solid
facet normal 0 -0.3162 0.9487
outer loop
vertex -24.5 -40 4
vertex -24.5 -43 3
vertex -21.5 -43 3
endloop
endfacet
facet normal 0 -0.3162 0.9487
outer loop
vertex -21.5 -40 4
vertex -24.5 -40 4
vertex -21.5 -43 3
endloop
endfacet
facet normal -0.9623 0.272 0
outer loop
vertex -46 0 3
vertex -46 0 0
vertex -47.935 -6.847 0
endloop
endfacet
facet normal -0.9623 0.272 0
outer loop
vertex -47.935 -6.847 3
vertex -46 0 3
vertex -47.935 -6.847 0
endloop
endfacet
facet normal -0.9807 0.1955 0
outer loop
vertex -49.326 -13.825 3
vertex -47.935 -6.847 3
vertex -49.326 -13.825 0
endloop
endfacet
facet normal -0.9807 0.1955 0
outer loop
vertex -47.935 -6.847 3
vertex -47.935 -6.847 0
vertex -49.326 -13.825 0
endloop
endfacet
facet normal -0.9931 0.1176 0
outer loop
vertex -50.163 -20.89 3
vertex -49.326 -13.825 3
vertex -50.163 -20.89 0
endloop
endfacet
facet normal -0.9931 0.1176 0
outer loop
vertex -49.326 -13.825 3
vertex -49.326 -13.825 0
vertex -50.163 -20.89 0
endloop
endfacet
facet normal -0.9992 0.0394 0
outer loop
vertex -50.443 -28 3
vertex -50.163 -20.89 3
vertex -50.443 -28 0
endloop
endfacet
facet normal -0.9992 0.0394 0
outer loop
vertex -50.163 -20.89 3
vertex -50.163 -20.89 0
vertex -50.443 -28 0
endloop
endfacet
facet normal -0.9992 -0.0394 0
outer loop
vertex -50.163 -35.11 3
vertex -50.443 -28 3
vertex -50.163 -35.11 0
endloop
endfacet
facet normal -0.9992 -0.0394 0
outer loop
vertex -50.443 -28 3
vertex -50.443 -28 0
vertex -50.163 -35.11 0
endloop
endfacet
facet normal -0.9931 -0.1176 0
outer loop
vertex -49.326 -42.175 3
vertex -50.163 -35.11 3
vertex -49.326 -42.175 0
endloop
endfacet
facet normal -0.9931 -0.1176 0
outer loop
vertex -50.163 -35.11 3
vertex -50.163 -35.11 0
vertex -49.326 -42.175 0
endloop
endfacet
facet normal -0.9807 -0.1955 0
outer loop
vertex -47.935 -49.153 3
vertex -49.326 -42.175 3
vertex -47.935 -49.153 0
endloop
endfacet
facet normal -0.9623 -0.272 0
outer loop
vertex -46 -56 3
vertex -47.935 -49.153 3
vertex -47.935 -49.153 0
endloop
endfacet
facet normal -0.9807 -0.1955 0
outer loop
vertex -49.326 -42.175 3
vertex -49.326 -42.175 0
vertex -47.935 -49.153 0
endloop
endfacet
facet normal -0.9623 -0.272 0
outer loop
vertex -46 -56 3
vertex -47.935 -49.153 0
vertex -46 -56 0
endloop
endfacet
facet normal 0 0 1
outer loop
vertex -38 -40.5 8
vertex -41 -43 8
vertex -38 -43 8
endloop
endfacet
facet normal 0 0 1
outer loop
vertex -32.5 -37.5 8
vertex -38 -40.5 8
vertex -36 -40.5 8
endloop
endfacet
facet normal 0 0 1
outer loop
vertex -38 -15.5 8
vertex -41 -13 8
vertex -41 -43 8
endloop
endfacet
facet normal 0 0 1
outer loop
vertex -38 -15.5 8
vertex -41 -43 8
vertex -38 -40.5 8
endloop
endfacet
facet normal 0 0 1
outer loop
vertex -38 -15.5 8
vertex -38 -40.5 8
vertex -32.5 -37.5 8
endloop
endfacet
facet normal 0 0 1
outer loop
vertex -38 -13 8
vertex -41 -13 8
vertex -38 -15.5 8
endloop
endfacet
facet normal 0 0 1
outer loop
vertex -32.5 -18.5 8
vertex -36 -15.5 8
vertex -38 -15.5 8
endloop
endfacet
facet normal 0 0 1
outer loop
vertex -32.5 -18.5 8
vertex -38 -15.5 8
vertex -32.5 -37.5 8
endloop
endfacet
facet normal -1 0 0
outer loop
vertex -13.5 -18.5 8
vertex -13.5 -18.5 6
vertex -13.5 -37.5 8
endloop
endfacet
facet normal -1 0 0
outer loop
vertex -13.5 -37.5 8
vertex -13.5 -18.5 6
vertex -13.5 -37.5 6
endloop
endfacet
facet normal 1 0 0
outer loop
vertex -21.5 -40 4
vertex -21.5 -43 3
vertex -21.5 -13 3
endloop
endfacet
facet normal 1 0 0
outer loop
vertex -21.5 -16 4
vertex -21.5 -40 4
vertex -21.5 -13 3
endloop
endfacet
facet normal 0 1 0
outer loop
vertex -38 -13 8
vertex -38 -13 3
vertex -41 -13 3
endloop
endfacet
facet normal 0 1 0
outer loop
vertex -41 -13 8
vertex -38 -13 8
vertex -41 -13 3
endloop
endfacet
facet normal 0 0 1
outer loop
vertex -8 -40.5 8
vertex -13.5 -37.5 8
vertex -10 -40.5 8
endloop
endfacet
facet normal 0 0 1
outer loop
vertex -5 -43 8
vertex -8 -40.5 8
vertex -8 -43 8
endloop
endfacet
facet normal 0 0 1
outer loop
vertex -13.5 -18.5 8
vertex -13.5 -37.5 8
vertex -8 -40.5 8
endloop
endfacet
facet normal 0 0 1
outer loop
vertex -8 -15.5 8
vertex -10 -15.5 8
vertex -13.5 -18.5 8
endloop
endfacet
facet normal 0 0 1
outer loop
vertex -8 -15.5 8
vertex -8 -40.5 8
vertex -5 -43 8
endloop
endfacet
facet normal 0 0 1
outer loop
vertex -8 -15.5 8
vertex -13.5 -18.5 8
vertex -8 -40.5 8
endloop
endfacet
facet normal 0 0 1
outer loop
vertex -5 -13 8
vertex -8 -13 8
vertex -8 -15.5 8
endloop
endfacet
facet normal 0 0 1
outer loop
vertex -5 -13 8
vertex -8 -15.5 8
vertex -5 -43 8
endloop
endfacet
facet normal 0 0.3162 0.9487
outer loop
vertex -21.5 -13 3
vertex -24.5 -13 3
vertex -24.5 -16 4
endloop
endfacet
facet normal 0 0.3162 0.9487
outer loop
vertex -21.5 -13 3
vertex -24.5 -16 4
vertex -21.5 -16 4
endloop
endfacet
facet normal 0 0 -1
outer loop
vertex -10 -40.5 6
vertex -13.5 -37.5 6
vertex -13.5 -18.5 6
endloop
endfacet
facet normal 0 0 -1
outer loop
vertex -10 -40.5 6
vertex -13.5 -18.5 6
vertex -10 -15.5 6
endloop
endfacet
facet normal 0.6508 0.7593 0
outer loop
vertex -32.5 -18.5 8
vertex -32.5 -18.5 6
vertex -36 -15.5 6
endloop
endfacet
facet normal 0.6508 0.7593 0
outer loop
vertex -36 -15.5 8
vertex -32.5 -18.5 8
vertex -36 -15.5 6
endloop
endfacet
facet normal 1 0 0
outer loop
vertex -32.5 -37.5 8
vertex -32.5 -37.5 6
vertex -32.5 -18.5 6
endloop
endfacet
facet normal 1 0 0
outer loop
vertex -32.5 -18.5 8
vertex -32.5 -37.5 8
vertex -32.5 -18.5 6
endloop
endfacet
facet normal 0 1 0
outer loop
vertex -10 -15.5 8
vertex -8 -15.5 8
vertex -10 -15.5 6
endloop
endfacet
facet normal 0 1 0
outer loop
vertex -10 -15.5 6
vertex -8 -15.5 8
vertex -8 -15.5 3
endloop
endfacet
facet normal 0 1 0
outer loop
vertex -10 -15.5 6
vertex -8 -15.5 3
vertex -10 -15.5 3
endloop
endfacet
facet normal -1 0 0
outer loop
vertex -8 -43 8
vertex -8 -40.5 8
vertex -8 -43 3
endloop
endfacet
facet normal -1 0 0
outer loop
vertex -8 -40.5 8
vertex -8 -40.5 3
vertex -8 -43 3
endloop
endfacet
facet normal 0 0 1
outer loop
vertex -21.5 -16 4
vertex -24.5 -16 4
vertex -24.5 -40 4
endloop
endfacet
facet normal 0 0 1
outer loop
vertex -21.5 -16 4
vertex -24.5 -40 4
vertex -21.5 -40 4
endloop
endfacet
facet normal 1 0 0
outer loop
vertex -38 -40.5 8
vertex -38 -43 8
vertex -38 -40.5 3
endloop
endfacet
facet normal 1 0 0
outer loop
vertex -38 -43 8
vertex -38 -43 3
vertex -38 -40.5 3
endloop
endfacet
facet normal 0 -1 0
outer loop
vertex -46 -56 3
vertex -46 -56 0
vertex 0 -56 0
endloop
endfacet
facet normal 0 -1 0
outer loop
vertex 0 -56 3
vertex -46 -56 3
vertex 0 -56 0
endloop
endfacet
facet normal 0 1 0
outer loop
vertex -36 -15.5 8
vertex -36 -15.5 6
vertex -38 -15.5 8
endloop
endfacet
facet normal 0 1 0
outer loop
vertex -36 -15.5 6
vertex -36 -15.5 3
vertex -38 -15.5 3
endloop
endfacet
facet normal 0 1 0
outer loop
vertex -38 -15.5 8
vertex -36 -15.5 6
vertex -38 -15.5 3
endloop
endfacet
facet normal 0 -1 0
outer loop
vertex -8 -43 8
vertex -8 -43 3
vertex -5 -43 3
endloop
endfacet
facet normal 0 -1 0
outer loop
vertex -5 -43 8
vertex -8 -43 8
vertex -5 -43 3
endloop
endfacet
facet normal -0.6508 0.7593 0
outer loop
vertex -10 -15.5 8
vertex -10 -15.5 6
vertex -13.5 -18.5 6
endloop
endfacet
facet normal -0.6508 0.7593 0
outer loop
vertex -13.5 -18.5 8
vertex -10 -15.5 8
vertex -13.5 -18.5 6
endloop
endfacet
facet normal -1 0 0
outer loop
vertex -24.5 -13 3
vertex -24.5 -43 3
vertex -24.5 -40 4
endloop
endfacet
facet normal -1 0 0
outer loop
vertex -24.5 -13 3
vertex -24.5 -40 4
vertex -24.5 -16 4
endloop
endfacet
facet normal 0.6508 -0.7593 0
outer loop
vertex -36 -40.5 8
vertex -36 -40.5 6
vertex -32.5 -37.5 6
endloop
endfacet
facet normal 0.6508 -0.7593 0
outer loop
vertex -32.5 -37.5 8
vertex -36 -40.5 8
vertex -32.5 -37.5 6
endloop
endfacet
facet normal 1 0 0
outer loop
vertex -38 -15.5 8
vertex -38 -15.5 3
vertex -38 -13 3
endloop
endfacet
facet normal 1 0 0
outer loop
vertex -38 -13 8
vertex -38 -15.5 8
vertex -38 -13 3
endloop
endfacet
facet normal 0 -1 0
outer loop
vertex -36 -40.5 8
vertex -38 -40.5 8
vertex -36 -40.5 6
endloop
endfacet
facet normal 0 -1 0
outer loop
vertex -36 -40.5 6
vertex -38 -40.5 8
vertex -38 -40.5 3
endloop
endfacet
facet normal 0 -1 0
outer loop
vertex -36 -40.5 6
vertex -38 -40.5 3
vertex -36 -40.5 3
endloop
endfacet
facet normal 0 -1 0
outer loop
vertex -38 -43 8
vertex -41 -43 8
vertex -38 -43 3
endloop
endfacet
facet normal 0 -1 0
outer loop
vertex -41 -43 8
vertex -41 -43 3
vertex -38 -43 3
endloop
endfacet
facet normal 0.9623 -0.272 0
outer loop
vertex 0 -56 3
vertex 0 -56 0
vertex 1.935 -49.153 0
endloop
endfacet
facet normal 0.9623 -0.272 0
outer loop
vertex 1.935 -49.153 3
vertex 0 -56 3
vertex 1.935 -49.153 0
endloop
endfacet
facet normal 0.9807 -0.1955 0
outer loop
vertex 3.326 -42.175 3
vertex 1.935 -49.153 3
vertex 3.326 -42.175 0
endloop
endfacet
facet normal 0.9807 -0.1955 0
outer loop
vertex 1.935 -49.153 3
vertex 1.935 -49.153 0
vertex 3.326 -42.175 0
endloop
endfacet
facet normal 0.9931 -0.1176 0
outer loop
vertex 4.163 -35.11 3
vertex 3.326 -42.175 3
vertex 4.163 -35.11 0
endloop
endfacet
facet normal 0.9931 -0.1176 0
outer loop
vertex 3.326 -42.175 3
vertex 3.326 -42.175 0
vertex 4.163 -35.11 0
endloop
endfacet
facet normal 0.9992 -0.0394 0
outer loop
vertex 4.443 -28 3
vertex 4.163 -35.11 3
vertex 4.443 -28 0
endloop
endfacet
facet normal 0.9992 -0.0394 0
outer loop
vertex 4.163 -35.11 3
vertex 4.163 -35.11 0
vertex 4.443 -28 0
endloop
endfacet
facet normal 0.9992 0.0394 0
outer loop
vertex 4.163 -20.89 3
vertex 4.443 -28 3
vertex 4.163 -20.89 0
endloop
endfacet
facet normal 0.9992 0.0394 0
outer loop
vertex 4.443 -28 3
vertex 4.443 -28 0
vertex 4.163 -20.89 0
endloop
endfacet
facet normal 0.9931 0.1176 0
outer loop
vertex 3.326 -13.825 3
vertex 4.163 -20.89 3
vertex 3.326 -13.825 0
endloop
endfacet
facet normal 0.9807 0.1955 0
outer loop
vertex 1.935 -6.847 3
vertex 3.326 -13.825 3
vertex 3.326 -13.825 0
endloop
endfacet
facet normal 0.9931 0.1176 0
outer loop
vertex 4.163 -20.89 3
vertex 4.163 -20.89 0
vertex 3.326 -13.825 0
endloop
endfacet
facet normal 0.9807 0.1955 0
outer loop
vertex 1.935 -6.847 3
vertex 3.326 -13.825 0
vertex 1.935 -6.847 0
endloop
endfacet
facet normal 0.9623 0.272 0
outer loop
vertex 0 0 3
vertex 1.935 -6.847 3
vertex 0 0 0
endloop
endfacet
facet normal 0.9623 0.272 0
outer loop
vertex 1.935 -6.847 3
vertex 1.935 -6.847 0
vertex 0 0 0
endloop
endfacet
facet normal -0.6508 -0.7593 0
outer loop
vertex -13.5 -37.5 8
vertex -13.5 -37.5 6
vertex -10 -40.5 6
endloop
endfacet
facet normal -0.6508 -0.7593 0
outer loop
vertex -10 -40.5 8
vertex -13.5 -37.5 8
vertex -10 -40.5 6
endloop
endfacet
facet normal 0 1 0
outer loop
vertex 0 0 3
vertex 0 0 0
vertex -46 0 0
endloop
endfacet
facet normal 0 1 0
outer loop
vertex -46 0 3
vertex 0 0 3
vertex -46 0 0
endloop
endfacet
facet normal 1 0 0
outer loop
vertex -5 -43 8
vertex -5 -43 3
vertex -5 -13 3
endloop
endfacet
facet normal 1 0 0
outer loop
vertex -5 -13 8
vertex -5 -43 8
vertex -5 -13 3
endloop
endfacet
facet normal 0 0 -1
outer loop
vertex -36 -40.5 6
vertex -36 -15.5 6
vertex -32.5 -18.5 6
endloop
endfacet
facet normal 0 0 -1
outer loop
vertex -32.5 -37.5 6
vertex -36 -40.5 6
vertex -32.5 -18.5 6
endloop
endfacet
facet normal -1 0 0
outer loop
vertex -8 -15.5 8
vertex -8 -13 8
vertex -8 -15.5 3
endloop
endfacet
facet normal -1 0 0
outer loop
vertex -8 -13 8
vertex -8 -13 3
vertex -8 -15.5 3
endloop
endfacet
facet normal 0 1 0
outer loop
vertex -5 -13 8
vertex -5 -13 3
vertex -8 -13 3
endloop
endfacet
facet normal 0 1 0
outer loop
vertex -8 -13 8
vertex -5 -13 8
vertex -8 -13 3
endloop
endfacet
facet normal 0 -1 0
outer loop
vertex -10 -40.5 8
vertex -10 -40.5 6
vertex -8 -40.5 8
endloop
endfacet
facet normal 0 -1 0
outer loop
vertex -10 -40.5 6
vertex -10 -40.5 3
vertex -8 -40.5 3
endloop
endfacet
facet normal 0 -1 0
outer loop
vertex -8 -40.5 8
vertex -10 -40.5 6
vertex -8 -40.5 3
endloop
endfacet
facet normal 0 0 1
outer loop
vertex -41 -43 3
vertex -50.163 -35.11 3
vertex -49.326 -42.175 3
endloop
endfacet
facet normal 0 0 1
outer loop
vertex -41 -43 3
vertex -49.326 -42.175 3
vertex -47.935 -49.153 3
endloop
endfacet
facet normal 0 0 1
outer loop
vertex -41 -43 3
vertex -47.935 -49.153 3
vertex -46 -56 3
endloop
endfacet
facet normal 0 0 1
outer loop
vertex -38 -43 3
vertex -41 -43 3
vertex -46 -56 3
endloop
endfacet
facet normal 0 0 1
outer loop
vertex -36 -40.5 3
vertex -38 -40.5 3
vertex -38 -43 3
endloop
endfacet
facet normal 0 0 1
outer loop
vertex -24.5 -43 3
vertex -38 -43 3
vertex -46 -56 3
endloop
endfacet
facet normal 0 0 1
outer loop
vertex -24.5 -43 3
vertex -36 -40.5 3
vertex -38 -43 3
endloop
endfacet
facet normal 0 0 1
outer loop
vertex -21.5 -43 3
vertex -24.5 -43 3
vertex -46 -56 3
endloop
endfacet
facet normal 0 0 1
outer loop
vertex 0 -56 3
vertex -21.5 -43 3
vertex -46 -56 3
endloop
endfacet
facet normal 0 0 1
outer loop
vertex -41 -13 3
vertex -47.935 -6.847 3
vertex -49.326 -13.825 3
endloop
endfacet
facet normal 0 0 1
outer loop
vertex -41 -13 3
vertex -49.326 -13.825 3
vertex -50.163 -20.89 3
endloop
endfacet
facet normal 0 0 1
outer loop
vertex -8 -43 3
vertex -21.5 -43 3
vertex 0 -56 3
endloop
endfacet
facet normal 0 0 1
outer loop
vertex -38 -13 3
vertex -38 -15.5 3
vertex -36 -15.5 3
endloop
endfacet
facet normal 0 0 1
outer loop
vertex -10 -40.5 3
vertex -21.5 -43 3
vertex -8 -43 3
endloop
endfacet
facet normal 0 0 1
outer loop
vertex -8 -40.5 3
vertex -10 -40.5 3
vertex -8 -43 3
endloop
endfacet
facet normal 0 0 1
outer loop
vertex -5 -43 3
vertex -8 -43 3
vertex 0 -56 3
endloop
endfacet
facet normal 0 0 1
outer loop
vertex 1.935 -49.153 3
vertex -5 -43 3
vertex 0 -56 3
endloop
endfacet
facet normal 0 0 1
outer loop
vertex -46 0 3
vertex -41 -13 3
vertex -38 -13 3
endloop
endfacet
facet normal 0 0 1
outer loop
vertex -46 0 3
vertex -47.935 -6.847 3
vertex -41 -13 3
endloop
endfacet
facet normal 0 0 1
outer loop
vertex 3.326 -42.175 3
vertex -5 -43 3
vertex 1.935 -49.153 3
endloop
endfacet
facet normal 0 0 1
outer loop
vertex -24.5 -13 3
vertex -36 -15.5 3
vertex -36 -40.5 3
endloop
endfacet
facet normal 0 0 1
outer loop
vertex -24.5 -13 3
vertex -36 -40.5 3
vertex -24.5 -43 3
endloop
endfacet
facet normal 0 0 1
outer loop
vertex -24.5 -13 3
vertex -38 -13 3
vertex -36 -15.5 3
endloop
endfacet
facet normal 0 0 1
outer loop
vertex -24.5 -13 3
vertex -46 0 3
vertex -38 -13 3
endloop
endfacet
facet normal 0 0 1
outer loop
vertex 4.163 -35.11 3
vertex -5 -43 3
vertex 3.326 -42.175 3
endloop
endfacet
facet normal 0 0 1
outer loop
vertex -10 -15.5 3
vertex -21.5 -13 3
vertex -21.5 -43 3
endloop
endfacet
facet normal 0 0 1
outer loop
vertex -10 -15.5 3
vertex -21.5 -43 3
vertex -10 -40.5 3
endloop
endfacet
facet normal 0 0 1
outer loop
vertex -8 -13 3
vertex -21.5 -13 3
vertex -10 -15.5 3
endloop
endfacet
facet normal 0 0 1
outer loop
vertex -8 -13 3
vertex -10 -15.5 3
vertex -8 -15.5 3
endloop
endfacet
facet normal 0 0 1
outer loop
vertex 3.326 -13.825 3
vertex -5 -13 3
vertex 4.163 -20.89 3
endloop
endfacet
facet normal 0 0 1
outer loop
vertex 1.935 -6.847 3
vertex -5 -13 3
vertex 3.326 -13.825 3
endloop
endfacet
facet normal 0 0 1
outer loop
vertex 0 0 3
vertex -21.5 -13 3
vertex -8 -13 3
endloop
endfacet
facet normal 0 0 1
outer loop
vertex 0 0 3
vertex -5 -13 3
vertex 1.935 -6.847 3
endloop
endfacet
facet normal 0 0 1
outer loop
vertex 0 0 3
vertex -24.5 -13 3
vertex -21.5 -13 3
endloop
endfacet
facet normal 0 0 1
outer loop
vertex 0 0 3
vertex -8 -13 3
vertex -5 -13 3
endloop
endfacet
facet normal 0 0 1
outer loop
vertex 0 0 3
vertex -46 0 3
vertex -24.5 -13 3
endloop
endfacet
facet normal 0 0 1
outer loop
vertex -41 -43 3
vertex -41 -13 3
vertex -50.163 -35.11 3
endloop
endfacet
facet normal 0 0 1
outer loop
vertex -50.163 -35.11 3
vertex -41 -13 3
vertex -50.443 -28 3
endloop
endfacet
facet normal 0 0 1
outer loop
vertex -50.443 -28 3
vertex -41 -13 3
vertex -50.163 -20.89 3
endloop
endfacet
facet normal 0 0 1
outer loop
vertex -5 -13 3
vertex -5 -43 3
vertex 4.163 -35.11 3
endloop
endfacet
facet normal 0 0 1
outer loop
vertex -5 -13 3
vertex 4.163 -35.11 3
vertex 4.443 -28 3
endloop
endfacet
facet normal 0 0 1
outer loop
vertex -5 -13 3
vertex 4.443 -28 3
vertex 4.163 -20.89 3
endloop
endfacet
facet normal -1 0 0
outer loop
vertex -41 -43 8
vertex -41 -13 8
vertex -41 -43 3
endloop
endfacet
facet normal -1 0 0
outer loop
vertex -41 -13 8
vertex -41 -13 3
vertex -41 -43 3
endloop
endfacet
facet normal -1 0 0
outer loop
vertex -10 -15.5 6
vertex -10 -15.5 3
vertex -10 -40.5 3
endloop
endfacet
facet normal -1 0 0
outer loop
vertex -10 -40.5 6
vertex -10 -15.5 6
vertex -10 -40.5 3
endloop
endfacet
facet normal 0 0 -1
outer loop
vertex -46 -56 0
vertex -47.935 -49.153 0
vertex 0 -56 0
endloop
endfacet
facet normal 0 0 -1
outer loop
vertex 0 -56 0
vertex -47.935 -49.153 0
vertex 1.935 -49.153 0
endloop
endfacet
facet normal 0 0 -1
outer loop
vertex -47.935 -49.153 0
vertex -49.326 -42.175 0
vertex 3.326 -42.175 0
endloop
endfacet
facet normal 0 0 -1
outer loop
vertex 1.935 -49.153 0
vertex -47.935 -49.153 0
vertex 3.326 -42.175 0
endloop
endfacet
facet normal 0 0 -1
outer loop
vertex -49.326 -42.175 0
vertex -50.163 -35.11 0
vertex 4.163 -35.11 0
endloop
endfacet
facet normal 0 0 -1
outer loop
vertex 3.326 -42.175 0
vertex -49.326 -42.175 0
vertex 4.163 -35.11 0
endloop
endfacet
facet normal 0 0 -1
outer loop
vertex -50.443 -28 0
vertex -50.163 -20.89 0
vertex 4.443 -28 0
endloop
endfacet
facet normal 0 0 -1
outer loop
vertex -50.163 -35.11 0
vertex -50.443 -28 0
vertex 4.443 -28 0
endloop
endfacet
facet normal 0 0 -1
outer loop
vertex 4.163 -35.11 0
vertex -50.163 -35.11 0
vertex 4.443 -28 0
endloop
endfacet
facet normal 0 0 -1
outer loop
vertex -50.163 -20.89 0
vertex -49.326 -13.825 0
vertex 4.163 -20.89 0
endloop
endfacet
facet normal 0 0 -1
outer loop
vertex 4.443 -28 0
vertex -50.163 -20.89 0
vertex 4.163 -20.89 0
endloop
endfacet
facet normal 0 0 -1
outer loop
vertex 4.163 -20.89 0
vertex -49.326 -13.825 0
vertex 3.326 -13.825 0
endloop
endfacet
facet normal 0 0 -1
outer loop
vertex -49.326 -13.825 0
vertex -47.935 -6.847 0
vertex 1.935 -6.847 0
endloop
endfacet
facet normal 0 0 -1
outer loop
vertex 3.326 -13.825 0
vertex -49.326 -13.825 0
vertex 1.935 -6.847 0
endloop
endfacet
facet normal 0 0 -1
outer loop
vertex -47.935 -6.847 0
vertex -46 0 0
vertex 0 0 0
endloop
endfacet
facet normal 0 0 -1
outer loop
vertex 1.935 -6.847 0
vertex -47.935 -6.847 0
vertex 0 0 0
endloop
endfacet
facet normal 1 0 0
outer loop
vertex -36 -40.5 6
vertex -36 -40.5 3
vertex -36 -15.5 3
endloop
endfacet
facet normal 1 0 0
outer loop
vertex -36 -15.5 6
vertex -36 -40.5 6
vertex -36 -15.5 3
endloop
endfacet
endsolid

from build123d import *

# Parameters (mm, degrees)
F1_DEPTH    = 3
F3_DEPTH    = 3
F5_DEPTH    = 2
F7_DEPTH    = 2
F8_W        = 3
F8_H        = 30
F9_DEPTH    = 1
F10_SIZE2   = 2.99999
F10_SIZE    = 0.99999
F10_2_SIZE2 = 2.99999
F10_2_SIZE  = 0.99999


# Not quite as in the source:
# - a fillet or chamfer is up to 0.001 mm smaller than in the source, because OpenCascade refuses the exact size


with BuildPart() as f1:
    # F0 (on Top) → F1 (new body)
    with BuildSketch(Plane.XY):
        with BuildLine():
            ThreePointArc((0, -56), (4.4433524368, -28), (0, 0))
            Line((0, 0), (-46, 0))
            ThreePointArc((-46, 0), (-50.4433524368, -28), (-46, -56))
            Line((-46, -56), (0, -56))
        make_face()
    extrude(amount=F1_DEPTH)

    # F2 (on face) → F3 (join)
    with BuildSketch(Plane.XY.offset(3)):
        Polygon((-38, -13), (-41, -13), (-41, -43), (-38, -43), (-38, -40.5), (-36, -40.5), (-36, -15.5), (-38, -15.5), align=None)
        Polygon((-5, -43), (-5, -13), (-8, -13), (-8, -15.5), (-10, -15.5), (-10, -40.5), (-8, -40.5), (-8, -43), align=None)
    extrude(amount=F3_DEPTH)

    # F4 (on face) → F5 (join)
    with BuildSketch(Plane.XY.offset(6)):
        Polygon((-38, -13), (-41, -13), (-41, -43), (-38, -43), (-38, -40.5), (-36, -40.5), (-32.5, -37.5), (-32.5, -18.5), (-36, -15.5), (-38, -15.5), align=None)
    extrude(amount=F5_DEPTH)

    # F6 (on face) → F7 (join)
    with BuildSketch(Plane.XY.offset(6)):
        Polygon((-5, -13), (-8, -13), (-8, -15.5), (-10, -15.5), (-13.5, -18.5), (-13.5, -37.5), (-10, -40.5), (-8, -40.5), (-8, -43), (-5, -43), align=None)
    extrude(amount=F7_DEPTH)

    # F8 (on face) → F9 (join)
    with BuildSketch(Plane.XY.offset(3)):
        with Locations((-23, -28)):
            Rectangle(F8_W, F8_H)
    extrude(amount=F9_DEPTH)

    # F10 (size 1 and 3 in the source; OpenCascade refuses exactly that, so slightly less here)
    f10_edges = [f1.edges().sort_by_distance(p)[0] for p in [
        (-23, -13, 4),
    ]]
    f10_side = f1.faces().sort_by_distance((-23, -13, 3.5))[0]
    chamfer(f10_edges, length=F10_SIZE, length2=F10_SIZE2, reference=f10_side)

    # F10#2 (size 1 and 3 in the source; OpenCascade refuses exactly that, so slightly less here)
    f10_2_edges = [f1.edges().sort_by_distance(p)[0] for p in [
        (-23, -43, 4),
    ]]
    f10_2_side = f1.faces().sort_by_distance((-23, -43, 3.5))[0]
    chamfer(f10_2_edges, length=F10_2_SIZE, length2=F10_2_SIZE2, reference=f10_2_side)


solid = f1.part
